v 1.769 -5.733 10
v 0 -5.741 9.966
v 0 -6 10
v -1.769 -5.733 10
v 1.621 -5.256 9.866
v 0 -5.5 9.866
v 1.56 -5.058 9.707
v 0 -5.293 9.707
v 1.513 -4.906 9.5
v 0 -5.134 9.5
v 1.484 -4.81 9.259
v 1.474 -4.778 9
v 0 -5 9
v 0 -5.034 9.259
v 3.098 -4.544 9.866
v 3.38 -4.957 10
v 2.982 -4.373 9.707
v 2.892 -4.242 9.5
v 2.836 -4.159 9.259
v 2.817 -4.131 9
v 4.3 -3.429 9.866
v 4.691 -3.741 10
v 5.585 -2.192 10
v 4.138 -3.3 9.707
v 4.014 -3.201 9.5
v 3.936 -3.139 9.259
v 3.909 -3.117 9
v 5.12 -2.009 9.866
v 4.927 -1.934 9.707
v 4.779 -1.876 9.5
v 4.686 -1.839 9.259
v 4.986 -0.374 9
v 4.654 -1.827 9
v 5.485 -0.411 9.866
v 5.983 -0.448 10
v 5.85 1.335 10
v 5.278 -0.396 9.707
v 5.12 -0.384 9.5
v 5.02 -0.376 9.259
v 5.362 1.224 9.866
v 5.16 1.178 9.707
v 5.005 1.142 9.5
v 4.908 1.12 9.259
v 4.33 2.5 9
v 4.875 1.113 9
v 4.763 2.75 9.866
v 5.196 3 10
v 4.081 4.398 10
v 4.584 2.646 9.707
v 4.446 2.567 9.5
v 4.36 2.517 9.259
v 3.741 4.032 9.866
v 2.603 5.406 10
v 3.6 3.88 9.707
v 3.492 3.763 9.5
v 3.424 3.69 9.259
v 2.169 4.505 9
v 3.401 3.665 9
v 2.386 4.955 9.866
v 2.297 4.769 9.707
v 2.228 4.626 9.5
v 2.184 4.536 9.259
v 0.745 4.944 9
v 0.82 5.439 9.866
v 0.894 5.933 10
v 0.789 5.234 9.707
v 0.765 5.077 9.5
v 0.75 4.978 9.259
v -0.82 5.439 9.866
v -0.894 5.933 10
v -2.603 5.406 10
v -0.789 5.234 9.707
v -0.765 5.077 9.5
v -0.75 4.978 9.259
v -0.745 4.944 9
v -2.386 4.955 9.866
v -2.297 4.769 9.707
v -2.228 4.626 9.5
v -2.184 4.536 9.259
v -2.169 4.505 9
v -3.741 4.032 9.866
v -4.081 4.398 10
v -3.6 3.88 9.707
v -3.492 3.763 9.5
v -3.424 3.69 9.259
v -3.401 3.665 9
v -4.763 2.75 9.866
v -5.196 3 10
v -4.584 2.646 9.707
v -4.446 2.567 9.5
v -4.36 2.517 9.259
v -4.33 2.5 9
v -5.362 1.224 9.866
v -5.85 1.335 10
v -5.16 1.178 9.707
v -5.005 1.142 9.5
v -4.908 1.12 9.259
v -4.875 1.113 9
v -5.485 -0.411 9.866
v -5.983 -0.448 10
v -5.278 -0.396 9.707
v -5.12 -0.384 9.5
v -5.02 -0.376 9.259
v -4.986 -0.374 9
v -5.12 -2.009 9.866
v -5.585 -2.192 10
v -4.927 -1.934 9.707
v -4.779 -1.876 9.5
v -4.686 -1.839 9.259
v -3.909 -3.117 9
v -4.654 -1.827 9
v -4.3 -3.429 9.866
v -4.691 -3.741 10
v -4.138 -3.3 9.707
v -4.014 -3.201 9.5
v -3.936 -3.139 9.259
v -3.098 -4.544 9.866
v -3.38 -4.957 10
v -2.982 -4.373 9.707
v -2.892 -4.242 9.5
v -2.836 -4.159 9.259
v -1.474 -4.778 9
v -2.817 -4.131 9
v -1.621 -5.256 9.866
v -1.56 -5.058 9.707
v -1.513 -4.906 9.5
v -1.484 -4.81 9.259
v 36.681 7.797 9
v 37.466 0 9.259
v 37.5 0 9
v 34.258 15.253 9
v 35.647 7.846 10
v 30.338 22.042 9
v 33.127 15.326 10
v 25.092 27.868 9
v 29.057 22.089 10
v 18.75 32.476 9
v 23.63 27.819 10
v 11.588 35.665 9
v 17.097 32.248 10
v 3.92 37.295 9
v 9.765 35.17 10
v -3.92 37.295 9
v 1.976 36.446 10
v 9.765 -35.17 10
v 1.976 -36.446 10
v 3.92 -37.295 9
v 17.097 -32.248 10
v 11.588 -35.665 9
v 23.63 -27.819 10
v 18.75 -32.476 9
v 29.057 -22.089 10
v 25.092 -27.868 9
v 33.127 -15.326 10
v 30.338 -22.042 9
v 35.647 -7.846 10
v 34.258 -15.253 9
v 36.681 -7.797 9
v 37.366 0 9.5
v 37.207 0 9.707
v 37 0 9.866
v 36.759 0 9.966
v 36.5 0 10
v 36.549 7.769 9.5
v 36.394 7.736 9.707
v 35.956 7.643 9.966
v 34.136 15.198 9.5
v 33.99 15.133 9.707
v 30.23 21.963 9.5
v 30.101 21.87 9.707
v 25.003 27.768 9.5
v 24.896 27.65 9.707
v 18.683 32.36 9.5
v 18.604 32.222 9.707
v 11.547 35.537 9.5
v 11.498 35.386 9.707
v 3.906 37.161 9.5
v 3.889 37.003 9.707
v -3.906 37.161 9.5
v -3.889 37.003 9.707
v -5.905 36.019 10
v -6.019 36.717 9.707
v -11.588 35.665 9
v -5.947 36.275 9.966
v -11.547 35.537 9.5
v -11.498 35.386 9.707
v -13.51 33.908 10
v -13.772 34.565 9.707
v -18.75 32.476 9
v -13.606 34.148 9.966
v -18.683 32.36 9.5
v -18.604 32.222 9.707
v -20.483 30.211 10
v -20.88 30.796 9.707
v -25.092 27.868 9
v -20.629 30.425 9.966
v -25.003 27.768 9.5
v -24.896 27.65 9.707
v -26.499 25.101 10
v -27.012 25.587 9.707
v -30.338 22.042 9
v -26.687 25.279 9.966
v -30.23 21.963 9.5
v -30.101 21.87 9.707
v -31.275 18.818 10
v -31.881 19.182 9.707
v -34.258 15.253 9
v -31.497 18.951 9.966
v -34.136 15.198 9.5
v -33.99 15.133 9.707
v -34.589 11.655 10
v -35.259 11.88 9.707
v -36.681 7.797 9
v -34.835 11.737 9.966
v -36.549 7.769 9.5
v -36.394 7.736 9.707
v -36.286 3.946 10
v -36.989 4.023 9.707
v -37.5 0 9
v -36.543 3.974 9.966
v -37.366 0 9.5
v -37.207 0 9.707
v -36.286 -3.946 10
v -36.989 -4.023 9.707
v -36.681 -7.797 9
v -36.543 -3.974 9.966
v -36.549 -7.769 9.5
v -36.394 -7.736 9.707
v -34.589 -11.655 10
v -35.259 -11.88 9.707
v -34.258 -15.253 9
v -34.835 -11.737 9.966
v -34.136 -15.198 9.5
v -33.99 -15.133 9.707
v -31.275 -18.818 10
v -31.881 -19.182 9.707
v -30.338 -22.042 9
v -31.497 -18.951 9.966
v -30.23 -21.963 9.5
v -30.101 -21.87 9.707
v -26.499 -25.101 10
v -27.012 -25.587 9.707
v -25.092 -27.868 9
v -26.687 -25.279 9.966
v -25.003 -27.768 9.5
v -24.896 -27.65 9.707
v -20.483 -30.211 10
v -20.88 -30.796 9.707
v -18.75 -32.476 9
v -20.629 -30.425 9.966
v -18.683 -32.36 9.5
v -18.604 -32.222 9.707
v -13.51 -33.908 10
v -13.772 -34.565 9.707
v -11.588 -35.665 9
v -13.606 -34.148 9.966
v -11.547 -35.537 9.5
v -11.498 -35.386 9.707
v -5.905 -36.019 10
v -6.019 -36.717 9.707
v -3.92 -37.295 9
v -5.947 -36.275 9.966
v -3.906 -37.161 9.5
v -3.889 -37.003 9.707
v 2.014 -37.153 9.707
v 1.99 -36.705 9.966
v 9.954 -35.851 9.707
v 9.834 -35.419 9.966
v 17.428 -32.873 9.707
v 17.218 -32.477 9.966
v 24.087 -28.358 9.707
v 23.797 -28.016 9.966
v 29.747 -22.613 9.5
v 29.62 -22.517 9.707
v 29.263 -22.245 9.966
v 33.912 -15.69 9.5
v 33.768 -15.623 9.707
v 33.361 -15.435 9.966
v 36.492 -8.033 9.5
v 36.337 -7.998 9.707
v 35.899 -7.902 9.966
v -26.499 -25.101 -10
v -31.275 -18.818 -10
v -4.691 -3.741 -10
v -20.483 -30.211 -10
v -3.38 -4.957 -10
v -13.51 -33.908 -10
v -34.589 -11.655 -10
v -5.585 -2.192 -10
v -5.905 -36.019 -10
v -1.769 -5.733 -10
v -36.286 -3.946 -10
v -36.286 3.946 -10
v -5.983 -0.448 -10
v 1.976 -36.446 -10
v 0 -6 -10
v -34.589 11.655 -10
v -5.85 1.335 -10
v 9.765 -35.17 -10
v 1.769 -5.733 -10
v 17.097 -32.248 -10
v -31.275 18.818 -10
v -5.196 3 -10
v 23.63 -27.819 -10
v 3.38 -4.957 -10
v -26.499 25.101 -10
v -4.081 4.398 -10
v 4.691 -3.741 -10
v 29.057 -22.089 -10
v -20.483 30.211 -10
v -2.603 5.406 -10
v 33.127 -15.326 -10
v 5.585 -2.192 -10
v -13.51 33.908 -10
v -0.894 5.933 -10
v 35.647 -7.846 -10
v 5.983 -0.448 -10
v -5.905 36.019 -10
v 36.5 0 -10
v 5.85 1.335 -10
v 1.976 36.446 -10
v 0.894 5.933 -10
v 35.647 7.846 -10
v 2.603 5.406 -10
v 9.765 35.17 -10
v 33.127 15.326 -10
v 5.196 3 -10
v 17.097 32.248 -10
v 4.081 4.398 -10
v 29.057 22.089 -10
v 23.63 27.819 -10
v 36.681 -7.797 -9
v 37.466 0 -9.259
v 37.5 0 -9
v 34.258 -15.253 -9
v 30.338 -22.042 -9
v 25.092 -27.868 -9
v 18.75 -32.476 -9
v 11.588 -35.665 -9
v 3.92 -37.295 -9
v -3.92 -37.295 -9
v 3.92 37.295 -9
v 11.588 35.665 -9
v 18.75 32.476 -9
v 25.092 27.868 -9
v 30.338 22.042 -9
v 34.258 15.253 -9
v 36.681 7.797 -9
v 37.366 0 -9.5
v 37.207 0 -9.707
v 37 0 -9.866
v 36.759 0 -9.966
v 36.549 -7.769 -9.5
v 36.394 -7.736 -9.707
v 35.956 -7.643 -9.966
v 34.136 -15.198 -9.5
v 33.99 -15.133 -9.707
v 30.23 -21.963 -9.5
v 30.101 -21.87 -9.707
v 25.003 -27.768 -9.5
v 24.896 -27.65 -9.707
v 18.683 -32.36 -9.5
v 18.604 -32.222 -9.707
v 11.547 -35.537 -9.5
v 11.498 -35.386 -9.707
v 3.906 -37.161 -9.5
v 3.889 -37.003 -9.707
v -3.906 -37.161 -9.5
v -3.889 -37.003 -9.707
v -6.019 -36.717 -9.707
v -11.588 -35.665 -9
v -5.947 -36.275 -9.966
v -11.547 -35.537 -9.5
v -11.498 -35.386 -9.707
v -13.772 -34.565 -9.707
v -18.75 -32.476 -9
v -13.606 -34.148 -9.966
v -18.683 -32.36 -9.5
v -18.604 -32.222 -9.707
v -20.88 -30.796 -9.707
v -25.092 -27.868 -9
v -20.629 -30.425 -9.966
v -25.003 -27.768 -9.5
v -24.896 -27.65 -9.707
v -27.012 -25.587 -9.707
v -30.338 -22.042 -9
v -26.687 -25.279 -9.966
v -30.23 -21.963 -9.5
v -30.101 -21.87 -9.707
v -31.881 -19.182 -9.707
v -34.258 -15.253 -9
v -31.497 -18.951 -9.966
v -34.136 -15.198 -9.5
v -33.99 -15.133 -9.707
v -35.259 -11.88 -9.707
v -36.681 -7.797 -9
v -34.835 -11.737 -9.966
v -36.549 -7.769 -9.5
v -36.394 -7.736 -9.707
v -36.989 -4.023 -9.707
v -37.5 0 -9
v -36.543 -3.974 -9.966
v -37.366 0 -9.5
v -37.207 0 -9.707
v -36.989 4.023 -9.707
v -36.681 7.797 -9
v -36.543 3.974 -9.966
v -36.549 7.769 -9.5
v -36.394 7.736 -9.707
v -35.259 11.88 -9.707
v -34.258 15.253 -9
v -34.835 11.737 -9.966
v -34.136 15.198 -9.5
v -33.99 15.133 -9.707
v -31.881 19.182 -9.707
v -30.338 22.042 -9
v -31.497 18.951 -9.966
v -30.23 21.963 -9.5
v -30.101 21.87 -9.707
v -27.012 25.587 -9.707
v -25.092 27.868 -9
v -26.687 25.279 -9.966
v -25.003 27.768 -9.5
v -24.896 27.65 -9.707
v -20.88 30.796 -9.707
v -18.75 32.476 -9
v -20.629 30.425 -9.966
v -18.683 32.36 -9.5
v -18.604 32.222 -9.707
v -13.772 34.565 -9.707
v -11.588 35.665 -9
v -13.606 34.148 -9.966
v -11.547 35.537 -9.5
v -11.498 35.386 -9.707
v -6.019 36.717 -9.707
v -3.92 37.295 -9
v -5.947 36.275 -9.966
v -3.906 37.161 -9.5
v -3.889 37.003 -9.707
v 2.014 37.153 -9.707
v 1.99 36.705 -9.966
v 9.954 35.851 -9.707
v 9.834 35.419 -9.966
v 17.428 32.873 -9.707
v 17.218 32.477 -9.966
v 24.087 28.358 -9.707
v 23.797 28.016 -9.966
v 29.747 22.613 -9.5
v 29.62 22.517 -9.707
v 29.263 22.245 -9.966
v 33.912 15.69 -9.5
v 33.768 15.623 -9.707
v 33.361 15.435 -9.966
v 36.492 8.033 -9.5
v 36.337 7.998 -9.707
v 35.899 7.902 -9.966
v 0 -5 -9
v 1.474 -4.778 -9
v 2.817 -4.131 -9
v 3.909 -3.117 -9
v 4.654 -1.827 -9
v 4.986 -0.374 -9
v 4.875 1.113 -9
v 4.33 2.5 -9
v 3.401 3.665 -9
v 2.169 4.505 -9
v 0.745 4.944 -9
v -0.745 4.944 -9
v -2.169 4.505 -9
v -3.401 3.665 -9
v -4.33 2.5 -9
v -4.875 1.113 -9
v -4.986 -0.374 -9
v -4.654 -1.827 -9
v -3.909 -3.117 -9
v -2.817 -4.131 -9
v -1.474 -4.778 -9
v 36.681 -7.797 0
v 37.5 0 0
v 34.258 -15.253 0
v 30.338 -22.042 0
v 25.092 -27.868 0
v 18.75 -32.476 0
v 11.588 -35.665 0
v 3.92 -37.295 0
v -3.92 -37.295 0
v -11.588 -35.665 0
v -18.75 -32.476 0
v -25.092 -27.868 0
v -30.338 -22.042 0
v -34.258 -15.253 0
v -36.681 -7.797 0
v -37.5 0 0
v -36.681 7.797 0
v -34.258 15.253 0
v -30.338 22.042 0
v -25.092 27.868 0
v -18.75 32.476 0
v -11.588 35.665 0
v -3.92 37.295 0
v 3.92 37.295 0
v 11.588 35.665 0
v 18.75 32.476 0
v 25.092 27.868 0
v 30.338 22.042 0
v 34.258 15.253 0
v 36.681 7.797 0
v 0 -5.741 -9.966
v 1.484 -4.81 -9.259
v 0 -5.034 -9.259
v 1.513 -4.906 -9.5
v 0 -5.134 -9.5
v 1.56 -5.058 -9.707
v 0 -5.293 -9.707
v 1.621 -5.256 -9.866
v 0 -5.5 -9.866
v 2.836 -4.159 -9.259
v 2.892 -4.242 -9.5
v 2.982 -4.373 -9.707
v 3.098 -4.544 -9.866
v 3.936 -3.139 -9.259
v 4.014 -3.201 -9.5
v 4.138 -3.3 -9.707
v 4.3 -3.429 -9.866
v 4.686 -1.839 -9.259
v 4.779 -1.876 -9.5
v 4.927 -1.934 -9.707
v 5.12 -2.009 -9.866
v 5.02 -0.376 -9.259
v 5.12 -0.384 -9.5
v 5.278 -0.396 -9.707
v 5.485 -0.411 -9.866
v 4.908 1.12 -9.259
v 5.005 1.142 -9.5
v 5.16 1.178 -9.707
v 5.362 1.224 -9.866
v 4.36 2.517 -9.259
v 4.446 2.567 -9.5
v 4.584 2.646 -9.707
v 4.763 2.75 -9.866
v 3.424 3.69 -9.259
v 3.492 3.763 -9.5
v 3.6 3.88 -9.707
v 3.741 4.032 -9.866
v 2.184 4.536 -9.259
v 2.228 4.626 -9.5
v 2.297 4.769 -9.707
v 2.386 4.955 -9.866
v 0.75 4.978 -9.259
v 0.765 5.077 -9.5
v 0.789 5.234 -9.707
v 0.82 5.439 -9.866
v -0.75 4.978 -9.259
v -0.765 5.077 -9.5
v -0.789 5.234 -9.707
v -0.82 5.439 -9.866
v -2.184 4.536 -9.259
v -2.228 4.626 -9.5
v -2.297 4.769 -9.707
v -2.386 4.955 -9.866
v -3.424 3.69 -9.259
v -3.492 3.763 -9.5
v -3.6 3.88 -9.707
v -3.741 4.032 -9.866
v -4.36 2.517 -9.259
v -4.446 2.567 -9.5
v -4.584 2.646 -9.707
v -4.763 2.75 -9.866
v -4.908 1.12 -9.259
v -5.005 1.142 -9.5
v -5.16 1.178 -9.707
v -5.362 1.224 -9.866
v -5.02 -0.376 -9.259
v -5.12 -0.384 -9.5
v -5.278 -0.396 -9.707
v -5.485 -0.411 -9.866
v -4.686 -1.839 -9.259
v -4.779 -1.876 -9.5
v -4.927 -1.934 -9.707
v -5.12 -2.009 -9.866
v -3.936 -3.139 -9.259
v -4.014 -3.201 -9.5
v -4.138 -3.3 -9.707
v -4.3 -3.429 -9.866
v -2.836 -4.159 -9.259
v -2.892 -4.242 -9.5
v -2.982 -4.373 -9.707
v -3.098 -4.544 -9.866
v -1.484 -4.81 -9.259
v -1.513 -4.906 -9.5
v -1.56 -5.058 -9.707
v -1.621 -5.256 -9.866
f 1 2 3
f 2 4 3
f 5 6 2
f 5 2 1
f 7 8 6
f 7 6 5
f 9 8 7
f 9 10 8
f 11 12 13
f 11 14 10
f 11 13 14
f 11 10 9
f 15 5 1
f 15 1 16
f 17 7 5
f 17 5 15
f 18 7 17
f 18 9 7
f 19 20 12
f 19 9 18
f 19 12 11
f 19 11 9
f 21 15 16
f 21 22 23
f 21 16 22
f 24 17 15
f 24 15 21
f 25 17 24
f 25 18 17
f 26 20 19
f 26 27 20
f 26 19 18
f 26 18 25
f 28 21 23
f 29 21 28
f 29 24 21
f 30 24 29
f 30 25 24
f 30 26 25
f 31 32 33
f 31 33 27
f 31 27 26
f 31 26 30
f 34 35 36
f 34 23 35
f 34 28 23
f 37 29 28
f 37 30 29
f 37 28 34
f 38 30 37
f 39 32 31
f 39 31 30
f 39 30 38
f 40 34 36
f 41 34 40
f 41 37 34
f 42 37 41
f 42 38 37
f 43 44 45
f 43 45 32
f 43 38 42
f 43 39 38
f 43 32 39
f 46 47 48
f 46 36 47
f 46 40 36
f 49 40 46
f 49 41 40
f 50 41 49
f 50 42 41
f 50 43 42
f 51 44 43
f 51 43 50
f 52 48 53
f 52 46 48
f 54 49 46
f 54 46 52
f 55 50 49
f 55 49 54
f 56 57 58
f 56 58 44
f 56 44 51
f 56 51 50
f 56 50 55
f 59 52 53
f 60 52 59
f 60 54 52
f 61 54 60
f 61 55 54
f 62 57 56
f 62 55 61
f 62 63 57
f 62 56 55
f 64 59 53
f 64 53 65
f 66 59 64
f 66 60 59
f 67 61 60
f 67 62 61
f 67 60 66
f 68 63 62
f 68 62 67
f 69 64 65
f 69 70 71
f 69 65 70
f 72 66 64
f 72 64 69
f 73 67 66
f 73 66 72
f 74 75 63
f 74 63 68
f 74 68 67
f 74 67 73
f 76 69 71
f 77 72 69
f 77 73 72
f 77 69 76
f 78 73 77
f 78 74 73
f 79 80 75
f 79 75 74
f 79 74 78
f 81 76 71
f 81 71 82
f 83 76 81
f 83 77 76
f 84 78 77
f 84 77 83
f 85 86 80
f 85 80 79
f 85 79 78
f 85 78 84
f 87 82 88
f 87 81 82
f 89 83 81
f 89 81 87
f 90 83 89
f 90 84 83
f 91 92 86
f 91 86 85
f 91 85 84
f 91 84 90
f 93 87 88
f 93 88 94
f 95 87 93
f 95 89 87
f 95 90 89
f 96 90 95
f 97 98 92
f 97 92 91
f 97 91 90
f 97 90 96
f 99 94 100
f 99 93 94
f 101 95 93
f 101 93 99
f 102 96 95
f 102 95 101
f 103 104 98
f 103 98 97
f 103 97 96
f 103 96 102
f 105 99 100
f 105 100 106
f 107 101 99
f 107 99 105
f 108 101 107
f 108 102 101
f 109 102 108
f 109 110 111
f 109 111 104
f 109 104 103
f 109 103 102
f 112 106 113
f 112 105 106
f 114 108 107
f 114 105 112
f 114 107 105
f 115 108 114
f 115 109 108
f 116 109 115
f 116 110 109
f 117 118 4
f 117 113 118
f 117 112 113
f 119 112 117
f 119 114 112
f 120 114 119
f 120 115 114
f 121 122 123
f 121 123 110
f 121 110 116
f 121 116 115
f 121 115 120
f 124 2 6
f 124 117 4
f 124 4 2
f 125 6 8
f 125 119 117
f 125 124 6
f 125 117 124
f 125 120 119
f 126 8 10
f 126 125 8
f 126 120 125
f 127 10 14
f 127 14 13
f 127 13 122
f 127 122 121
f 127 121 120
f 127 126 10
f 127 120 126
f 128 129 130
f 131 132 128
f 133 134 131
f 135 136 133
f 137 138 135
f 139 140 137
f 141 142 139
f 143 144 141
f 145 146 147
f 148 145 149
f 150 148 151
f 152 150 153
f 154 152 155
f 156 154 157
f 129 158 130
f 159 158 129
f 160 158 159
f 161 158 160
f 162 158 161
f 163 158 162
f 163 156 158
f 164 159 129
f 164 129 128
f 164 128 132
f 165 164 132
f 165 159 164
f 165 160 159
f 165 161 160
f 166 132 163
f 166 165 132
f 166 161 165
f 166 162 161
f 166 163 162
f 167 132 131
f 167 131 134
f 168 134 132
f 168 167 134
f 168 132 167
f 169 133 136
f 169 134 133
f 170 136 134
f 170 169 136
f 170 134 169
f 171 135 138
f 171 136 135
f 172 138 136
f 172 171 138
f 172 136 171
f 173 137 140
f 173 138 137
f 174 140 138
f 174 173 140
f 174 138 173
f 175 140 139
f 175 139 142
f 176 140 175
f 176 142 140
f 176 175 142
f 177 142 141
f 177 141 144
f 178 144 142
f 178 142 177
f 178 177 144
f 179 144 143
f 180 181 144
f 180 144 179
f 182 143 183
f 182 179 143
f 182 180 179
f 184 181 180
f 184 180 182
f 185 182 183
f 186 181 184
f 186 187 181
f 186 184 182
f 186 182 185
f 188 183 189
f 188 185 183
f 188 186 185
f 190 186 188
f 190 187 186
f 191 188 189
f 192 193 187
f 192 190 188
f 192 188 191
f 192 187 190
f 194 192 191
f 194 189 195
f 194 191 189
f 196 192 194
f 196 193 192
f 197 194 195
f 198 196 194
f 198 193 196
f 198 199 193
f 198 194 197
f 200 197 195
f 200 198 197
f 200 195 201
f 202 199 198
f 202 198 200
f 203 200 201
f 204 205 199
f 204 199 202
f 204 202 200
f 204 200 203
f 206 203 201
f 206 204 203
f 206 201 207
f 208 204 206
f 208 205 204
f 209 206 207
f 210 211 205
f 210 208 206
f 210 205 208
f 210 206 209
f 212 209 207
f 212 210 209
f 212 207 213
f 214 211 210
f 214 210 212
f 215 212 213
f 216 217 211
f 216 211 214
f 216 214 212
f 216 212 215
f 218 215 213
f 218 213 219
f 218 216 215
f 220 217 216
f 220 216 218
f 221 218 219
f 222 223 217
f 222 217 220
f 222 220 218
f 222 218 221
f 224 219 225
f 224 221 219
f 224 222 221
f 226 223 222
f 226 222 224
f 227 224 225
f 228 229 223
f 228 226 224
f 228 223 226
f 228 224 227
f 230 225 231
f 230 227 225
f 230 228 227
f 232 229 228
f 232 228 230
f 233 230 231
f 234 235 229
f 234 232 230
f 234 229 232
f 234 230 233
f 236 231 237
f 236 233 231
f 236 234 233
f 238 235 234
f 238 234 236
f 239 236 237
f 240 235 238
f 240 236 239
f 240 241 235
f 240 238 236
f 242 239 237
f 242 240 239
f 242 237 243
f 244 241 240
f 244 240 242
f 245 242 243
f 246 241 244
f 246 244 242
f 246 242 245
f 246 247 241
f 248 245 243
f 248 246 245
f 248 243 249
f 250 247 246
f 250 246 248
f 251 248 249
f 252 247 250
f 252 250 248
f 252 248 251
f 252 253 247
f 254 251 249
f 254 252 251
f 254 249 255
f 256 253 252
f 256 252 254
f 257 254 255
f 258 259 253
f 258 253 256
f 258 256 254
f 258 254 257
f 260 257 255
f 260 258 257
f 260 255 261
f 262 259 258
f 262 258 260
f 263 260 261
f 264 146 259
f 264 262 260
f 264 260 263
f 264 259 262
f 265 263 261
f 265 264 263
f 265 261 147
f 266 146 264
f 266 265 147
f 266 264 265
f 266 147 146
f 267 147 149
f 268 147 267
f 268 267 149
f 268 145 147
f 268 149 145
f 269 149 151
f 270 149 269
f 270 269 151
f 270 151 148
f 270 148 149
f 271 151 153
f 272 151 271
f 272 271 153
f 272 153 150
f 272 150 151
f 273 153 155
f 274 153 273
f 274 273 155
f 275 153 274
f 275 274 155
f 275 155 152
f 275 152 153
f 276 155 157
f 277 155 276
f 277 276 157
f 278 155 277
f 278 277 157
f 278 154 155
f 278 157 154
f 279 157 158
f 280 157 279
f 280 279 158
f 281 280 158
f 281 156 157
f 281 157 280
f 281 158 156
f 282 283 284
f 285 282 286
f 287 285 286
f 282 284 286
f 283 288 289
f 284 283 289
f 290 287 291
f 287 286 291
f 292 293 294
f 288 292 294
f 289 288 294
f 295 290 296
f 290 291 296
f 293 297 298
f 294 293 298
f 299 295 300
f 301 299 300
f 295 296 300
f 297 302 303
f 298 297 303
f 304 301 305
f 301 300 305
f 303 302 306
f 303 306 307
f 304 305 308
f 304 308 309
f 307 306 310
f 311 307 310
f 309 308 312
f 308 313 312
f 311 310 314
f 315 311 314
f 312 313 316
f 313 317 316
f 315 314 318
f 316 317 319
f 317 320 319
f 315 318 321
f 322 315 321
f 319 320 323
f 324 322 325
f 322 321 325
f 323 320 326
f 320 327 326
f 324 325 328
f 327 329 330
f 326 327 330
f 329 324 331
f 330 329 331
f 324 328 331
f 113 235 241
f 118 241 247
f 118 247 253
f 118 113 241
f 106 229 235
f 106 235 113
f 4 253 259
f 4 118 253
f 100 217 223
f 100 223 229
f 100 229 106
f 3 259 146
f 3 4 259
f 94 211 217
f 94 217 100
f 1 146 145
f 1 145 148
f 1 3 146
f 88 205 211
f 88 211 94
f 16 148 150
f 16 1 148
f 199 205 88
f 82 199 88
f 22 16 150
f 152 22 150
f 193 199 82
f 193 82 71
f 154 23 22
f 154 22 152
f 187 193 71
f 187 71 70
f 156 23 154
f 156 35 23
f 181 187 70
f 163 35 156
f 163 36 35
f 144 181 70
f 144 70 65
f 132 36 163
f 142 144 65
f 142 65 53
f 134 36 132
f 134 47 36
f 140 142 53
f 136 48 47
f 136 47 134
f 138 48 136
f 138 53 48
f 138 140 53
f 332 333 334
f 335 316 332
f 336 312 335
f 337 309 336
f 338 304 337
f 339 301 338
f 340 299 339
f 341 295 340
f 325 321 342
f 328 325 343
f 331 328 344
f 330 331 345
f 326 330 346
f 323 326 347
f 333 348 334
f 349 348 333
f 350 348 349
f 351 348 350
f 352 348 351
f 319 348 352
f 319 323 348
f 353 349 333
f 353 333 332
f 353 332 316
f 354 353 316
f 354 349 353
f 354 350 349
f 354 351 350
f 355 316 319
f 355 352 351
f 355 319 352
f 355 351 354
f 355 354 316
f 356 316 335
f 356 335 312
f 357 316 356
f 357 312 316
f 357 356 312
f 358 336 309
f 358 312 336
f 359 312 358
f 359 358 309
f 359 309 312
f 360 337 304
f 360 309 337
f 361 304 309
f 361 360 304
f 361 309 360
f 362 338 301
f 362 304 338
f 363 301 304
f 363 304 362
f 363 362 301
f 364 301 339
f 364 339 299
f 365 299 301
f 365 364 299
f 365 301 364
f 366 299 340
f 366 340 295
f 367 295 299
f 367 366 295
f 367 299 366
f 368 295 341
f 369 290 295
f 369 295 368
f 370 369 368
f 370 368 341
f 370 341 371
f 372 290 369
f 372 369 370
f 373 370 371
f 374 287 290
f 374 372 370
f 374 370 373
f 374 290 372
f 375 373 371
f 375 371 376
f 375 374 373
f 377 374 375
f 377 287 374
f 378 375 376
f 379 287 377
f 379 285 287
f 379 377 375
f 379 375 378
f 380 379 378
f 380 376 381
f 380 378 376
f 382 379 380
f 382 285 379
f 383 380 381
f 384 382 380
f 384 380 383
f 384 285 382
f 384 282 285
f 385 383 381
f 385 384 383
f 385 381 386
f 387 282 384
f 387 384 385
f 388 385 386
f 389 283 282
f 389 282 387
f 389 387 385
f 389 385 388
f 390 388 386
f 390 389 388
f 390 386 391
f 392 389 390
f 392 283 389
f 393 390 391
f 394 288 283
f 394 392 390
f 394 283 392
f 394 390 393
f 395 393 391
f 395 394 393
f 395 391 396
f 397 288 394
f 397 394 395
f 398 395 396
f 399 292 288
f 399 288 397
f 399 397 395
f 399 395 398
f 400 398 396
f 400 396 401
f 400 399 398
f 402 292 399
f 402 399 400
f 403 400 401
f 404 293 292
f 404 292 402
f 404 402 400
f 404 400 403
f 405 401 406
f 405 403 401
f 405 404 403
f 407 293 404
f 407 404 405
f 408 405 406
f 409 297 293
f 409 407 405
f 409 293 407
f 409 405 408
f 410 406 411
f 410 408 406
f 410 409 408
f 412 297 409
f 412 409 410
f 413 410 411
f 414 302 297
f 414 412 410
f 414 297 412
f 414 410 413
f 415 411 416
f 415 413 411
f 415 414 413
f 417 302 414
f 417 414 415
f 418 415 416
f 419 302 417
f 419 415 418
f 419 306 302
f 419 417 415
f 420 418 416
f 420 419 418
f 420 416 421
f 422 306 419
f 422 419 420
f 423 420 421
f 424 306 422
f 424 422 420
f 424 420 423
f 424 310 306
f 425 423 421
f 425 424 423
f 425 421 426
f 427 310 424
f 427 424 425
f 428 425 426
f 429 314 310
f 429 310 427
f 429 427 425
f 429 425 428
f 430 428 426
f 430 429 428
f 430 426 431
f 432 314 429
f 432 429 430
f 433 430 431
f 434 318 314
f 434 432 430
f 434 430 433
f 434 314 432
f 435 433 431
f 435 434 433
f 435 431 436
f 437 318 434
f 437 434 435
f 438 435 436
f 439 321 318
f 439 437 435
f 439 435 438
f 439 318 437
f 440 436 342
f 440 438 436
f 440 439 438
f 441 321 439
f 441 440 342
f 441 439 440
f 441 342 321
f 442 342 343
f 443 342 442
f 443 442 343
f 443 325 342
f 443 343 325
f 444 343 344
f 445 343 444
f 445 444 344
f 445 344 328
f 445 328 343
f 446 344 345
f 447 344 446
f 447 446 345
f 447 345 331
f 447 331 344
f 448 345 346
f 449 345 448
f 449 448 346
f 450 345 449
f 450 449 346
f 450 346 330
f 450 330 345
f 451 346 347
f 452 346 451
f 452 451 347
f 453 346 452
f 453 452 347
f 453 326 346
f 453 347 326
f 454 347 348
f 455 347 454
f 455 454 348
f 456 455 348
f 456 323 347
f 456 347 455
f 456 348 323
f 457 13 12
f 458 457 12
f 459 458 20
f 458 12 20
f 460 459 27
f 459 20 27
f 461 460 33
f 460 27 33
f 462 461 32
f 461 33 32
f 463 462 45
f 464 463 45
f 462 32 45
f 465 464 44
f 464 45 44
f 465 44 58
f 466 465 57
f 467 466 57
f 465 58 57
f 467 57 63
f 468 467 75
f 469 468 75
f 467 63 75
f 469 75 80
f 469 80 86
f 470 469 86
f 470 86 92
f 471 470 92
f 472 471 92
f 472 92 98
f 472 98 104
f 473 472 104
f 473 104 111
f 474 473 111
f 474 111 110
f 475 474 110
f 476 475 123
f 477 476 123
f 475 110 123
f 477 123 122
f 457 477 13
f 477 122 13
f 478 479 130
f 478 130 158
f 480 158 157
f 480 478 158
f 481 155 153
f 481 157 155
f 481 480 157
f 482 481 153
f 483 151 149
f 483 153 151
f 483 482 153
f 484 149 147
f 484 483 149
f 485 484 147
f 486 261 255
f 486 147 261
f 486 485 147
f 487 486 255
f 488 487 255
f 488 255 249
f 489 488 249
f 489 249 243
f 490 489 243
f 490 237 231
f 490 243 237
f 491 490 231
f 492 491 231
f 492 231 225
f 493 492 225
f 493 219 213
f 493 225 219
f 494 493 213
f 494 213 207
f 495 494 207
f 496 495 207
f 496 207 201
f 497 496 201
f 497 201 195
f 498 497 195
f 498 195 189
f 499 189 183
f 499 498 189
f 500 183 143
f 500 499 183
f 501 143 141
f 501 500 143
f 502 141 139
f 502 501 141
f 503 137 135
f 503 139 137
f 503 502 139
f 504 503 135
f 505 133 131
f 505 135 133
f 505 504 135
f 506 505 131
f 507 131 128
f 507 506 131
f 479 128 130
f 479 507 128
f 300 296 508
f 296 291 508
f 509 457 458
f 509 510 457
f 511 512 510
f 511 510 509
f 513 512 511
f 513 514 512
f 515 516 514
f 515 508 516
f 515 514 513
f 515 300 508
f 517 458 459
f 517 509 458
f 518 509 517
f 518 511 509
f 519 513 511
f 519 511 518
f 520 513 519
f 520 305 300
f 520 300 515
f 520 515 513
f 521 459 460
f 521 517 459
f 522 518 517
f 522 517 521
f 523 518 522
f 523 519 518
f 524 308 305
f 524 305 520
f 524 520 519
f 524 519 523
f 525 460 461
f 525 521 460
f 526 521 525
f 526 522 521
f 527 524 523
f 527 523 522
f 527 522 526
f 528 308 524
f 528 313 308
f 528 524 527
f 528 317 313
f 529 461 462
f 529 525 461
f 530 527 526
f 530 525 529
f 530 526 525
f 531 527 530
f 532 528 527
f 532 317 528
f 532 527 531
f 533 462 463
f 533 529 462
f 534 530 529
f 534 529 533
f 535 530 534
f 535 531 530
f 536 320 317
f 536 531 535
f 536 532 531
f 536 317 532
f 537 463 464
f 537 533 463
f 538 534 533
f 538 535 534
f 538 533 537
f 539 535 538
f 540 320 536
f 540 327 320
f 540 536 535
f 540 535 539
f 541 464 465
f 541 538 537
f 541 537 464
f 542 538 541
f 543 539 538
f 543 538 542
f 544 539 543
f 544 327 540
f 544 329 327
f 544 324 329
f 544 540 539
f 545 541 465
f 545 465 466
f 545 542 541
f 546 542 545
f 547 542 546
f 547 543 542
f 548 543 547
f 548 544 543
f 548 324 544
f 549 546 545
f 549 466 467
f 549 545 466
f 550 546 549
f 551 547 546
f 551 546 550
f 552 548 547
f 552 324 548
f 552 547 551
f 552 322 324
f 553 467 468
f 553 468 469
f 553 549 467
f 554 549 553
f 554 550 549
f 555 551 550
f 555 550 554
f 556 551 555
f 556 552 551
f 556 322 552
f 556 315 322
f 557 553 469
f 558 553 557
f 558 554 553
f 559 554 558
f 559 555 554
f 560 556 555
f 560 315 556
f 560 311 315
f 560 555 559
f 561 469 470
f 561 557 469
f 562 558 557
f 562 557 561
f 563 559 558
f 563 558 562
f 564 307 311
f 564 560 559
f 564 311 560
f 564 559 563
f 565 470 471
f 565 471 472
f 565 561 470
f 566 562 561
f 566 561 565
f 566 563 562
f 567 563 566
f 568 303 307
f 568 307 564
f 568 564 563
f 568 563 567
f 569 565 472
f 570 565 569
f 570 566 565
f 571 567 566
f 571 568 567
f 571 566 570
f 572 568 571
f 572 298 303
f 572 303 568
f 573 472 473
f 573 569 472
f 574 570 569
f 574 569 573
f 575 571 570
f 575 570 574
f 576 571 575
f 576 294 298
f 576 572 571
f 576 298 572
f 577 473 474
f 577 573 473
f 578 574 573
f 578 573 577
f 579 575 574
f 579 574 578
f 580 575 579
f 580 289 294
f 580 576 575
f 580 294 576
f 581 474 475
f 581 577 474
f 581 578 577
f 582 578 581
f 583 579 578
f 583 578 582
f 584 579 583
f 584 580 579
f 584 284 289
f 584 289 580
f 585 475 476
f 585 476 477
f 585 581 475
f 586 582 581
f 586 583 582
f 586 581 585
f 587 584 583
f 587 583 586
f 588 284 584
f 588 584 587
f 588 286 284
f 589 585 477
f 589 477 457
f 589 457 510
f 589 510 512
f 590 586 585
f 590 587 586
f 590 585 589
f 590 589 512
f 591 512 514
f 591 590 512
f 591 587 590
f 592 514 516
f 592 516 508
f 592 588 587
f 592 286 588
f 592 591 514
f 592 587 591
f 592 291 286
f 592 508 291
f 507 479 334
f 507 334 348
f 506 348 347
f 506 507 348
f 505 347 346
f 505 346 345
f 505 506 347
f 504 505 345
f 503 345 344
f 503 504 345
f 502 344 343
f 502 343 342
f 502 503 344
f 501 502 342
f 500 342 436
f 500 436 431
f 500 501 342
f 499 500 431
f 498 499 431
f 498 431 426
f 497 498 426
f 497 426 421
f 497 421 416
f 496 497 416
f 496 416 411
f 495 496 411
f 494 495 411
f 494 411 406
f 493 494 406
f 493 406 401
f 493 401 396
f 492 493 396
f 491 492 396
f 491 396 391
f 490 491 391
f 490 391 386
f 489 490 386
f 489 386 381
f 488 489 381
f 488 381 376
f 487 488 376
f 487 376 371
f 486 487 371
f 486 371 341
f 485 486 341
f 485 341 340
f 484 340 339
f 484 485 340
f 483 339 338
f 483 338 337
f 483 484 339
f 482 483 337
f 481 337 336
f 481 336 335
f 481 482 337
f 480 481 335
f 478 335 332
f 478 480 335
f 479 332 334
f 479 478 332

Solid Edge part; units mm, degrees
sketch "Sketch1" plane through (0, 0, 0) normal (0, 0, 1) x (1, 0, 0)
  circle A0 centre (0, 0) radius 37.5
  dimension "D1" = 75
extrude "ExtrudedProtrusion_1" add sketch "Sketch1" along normal mid plane 20
fillet "Round_1" radius 1 2 edges at (-37.5, 0, 10) (-37.5, 0, -10)
hole "Hole_1" at (0, 0, 10) direction (0, 0, -1) diameter 10 end up to next
fillet "Round_2" radius 1 2 edges at (-5, 0, 10) (5, 0, -10)
properties material "Acrylic, high impact grade"
